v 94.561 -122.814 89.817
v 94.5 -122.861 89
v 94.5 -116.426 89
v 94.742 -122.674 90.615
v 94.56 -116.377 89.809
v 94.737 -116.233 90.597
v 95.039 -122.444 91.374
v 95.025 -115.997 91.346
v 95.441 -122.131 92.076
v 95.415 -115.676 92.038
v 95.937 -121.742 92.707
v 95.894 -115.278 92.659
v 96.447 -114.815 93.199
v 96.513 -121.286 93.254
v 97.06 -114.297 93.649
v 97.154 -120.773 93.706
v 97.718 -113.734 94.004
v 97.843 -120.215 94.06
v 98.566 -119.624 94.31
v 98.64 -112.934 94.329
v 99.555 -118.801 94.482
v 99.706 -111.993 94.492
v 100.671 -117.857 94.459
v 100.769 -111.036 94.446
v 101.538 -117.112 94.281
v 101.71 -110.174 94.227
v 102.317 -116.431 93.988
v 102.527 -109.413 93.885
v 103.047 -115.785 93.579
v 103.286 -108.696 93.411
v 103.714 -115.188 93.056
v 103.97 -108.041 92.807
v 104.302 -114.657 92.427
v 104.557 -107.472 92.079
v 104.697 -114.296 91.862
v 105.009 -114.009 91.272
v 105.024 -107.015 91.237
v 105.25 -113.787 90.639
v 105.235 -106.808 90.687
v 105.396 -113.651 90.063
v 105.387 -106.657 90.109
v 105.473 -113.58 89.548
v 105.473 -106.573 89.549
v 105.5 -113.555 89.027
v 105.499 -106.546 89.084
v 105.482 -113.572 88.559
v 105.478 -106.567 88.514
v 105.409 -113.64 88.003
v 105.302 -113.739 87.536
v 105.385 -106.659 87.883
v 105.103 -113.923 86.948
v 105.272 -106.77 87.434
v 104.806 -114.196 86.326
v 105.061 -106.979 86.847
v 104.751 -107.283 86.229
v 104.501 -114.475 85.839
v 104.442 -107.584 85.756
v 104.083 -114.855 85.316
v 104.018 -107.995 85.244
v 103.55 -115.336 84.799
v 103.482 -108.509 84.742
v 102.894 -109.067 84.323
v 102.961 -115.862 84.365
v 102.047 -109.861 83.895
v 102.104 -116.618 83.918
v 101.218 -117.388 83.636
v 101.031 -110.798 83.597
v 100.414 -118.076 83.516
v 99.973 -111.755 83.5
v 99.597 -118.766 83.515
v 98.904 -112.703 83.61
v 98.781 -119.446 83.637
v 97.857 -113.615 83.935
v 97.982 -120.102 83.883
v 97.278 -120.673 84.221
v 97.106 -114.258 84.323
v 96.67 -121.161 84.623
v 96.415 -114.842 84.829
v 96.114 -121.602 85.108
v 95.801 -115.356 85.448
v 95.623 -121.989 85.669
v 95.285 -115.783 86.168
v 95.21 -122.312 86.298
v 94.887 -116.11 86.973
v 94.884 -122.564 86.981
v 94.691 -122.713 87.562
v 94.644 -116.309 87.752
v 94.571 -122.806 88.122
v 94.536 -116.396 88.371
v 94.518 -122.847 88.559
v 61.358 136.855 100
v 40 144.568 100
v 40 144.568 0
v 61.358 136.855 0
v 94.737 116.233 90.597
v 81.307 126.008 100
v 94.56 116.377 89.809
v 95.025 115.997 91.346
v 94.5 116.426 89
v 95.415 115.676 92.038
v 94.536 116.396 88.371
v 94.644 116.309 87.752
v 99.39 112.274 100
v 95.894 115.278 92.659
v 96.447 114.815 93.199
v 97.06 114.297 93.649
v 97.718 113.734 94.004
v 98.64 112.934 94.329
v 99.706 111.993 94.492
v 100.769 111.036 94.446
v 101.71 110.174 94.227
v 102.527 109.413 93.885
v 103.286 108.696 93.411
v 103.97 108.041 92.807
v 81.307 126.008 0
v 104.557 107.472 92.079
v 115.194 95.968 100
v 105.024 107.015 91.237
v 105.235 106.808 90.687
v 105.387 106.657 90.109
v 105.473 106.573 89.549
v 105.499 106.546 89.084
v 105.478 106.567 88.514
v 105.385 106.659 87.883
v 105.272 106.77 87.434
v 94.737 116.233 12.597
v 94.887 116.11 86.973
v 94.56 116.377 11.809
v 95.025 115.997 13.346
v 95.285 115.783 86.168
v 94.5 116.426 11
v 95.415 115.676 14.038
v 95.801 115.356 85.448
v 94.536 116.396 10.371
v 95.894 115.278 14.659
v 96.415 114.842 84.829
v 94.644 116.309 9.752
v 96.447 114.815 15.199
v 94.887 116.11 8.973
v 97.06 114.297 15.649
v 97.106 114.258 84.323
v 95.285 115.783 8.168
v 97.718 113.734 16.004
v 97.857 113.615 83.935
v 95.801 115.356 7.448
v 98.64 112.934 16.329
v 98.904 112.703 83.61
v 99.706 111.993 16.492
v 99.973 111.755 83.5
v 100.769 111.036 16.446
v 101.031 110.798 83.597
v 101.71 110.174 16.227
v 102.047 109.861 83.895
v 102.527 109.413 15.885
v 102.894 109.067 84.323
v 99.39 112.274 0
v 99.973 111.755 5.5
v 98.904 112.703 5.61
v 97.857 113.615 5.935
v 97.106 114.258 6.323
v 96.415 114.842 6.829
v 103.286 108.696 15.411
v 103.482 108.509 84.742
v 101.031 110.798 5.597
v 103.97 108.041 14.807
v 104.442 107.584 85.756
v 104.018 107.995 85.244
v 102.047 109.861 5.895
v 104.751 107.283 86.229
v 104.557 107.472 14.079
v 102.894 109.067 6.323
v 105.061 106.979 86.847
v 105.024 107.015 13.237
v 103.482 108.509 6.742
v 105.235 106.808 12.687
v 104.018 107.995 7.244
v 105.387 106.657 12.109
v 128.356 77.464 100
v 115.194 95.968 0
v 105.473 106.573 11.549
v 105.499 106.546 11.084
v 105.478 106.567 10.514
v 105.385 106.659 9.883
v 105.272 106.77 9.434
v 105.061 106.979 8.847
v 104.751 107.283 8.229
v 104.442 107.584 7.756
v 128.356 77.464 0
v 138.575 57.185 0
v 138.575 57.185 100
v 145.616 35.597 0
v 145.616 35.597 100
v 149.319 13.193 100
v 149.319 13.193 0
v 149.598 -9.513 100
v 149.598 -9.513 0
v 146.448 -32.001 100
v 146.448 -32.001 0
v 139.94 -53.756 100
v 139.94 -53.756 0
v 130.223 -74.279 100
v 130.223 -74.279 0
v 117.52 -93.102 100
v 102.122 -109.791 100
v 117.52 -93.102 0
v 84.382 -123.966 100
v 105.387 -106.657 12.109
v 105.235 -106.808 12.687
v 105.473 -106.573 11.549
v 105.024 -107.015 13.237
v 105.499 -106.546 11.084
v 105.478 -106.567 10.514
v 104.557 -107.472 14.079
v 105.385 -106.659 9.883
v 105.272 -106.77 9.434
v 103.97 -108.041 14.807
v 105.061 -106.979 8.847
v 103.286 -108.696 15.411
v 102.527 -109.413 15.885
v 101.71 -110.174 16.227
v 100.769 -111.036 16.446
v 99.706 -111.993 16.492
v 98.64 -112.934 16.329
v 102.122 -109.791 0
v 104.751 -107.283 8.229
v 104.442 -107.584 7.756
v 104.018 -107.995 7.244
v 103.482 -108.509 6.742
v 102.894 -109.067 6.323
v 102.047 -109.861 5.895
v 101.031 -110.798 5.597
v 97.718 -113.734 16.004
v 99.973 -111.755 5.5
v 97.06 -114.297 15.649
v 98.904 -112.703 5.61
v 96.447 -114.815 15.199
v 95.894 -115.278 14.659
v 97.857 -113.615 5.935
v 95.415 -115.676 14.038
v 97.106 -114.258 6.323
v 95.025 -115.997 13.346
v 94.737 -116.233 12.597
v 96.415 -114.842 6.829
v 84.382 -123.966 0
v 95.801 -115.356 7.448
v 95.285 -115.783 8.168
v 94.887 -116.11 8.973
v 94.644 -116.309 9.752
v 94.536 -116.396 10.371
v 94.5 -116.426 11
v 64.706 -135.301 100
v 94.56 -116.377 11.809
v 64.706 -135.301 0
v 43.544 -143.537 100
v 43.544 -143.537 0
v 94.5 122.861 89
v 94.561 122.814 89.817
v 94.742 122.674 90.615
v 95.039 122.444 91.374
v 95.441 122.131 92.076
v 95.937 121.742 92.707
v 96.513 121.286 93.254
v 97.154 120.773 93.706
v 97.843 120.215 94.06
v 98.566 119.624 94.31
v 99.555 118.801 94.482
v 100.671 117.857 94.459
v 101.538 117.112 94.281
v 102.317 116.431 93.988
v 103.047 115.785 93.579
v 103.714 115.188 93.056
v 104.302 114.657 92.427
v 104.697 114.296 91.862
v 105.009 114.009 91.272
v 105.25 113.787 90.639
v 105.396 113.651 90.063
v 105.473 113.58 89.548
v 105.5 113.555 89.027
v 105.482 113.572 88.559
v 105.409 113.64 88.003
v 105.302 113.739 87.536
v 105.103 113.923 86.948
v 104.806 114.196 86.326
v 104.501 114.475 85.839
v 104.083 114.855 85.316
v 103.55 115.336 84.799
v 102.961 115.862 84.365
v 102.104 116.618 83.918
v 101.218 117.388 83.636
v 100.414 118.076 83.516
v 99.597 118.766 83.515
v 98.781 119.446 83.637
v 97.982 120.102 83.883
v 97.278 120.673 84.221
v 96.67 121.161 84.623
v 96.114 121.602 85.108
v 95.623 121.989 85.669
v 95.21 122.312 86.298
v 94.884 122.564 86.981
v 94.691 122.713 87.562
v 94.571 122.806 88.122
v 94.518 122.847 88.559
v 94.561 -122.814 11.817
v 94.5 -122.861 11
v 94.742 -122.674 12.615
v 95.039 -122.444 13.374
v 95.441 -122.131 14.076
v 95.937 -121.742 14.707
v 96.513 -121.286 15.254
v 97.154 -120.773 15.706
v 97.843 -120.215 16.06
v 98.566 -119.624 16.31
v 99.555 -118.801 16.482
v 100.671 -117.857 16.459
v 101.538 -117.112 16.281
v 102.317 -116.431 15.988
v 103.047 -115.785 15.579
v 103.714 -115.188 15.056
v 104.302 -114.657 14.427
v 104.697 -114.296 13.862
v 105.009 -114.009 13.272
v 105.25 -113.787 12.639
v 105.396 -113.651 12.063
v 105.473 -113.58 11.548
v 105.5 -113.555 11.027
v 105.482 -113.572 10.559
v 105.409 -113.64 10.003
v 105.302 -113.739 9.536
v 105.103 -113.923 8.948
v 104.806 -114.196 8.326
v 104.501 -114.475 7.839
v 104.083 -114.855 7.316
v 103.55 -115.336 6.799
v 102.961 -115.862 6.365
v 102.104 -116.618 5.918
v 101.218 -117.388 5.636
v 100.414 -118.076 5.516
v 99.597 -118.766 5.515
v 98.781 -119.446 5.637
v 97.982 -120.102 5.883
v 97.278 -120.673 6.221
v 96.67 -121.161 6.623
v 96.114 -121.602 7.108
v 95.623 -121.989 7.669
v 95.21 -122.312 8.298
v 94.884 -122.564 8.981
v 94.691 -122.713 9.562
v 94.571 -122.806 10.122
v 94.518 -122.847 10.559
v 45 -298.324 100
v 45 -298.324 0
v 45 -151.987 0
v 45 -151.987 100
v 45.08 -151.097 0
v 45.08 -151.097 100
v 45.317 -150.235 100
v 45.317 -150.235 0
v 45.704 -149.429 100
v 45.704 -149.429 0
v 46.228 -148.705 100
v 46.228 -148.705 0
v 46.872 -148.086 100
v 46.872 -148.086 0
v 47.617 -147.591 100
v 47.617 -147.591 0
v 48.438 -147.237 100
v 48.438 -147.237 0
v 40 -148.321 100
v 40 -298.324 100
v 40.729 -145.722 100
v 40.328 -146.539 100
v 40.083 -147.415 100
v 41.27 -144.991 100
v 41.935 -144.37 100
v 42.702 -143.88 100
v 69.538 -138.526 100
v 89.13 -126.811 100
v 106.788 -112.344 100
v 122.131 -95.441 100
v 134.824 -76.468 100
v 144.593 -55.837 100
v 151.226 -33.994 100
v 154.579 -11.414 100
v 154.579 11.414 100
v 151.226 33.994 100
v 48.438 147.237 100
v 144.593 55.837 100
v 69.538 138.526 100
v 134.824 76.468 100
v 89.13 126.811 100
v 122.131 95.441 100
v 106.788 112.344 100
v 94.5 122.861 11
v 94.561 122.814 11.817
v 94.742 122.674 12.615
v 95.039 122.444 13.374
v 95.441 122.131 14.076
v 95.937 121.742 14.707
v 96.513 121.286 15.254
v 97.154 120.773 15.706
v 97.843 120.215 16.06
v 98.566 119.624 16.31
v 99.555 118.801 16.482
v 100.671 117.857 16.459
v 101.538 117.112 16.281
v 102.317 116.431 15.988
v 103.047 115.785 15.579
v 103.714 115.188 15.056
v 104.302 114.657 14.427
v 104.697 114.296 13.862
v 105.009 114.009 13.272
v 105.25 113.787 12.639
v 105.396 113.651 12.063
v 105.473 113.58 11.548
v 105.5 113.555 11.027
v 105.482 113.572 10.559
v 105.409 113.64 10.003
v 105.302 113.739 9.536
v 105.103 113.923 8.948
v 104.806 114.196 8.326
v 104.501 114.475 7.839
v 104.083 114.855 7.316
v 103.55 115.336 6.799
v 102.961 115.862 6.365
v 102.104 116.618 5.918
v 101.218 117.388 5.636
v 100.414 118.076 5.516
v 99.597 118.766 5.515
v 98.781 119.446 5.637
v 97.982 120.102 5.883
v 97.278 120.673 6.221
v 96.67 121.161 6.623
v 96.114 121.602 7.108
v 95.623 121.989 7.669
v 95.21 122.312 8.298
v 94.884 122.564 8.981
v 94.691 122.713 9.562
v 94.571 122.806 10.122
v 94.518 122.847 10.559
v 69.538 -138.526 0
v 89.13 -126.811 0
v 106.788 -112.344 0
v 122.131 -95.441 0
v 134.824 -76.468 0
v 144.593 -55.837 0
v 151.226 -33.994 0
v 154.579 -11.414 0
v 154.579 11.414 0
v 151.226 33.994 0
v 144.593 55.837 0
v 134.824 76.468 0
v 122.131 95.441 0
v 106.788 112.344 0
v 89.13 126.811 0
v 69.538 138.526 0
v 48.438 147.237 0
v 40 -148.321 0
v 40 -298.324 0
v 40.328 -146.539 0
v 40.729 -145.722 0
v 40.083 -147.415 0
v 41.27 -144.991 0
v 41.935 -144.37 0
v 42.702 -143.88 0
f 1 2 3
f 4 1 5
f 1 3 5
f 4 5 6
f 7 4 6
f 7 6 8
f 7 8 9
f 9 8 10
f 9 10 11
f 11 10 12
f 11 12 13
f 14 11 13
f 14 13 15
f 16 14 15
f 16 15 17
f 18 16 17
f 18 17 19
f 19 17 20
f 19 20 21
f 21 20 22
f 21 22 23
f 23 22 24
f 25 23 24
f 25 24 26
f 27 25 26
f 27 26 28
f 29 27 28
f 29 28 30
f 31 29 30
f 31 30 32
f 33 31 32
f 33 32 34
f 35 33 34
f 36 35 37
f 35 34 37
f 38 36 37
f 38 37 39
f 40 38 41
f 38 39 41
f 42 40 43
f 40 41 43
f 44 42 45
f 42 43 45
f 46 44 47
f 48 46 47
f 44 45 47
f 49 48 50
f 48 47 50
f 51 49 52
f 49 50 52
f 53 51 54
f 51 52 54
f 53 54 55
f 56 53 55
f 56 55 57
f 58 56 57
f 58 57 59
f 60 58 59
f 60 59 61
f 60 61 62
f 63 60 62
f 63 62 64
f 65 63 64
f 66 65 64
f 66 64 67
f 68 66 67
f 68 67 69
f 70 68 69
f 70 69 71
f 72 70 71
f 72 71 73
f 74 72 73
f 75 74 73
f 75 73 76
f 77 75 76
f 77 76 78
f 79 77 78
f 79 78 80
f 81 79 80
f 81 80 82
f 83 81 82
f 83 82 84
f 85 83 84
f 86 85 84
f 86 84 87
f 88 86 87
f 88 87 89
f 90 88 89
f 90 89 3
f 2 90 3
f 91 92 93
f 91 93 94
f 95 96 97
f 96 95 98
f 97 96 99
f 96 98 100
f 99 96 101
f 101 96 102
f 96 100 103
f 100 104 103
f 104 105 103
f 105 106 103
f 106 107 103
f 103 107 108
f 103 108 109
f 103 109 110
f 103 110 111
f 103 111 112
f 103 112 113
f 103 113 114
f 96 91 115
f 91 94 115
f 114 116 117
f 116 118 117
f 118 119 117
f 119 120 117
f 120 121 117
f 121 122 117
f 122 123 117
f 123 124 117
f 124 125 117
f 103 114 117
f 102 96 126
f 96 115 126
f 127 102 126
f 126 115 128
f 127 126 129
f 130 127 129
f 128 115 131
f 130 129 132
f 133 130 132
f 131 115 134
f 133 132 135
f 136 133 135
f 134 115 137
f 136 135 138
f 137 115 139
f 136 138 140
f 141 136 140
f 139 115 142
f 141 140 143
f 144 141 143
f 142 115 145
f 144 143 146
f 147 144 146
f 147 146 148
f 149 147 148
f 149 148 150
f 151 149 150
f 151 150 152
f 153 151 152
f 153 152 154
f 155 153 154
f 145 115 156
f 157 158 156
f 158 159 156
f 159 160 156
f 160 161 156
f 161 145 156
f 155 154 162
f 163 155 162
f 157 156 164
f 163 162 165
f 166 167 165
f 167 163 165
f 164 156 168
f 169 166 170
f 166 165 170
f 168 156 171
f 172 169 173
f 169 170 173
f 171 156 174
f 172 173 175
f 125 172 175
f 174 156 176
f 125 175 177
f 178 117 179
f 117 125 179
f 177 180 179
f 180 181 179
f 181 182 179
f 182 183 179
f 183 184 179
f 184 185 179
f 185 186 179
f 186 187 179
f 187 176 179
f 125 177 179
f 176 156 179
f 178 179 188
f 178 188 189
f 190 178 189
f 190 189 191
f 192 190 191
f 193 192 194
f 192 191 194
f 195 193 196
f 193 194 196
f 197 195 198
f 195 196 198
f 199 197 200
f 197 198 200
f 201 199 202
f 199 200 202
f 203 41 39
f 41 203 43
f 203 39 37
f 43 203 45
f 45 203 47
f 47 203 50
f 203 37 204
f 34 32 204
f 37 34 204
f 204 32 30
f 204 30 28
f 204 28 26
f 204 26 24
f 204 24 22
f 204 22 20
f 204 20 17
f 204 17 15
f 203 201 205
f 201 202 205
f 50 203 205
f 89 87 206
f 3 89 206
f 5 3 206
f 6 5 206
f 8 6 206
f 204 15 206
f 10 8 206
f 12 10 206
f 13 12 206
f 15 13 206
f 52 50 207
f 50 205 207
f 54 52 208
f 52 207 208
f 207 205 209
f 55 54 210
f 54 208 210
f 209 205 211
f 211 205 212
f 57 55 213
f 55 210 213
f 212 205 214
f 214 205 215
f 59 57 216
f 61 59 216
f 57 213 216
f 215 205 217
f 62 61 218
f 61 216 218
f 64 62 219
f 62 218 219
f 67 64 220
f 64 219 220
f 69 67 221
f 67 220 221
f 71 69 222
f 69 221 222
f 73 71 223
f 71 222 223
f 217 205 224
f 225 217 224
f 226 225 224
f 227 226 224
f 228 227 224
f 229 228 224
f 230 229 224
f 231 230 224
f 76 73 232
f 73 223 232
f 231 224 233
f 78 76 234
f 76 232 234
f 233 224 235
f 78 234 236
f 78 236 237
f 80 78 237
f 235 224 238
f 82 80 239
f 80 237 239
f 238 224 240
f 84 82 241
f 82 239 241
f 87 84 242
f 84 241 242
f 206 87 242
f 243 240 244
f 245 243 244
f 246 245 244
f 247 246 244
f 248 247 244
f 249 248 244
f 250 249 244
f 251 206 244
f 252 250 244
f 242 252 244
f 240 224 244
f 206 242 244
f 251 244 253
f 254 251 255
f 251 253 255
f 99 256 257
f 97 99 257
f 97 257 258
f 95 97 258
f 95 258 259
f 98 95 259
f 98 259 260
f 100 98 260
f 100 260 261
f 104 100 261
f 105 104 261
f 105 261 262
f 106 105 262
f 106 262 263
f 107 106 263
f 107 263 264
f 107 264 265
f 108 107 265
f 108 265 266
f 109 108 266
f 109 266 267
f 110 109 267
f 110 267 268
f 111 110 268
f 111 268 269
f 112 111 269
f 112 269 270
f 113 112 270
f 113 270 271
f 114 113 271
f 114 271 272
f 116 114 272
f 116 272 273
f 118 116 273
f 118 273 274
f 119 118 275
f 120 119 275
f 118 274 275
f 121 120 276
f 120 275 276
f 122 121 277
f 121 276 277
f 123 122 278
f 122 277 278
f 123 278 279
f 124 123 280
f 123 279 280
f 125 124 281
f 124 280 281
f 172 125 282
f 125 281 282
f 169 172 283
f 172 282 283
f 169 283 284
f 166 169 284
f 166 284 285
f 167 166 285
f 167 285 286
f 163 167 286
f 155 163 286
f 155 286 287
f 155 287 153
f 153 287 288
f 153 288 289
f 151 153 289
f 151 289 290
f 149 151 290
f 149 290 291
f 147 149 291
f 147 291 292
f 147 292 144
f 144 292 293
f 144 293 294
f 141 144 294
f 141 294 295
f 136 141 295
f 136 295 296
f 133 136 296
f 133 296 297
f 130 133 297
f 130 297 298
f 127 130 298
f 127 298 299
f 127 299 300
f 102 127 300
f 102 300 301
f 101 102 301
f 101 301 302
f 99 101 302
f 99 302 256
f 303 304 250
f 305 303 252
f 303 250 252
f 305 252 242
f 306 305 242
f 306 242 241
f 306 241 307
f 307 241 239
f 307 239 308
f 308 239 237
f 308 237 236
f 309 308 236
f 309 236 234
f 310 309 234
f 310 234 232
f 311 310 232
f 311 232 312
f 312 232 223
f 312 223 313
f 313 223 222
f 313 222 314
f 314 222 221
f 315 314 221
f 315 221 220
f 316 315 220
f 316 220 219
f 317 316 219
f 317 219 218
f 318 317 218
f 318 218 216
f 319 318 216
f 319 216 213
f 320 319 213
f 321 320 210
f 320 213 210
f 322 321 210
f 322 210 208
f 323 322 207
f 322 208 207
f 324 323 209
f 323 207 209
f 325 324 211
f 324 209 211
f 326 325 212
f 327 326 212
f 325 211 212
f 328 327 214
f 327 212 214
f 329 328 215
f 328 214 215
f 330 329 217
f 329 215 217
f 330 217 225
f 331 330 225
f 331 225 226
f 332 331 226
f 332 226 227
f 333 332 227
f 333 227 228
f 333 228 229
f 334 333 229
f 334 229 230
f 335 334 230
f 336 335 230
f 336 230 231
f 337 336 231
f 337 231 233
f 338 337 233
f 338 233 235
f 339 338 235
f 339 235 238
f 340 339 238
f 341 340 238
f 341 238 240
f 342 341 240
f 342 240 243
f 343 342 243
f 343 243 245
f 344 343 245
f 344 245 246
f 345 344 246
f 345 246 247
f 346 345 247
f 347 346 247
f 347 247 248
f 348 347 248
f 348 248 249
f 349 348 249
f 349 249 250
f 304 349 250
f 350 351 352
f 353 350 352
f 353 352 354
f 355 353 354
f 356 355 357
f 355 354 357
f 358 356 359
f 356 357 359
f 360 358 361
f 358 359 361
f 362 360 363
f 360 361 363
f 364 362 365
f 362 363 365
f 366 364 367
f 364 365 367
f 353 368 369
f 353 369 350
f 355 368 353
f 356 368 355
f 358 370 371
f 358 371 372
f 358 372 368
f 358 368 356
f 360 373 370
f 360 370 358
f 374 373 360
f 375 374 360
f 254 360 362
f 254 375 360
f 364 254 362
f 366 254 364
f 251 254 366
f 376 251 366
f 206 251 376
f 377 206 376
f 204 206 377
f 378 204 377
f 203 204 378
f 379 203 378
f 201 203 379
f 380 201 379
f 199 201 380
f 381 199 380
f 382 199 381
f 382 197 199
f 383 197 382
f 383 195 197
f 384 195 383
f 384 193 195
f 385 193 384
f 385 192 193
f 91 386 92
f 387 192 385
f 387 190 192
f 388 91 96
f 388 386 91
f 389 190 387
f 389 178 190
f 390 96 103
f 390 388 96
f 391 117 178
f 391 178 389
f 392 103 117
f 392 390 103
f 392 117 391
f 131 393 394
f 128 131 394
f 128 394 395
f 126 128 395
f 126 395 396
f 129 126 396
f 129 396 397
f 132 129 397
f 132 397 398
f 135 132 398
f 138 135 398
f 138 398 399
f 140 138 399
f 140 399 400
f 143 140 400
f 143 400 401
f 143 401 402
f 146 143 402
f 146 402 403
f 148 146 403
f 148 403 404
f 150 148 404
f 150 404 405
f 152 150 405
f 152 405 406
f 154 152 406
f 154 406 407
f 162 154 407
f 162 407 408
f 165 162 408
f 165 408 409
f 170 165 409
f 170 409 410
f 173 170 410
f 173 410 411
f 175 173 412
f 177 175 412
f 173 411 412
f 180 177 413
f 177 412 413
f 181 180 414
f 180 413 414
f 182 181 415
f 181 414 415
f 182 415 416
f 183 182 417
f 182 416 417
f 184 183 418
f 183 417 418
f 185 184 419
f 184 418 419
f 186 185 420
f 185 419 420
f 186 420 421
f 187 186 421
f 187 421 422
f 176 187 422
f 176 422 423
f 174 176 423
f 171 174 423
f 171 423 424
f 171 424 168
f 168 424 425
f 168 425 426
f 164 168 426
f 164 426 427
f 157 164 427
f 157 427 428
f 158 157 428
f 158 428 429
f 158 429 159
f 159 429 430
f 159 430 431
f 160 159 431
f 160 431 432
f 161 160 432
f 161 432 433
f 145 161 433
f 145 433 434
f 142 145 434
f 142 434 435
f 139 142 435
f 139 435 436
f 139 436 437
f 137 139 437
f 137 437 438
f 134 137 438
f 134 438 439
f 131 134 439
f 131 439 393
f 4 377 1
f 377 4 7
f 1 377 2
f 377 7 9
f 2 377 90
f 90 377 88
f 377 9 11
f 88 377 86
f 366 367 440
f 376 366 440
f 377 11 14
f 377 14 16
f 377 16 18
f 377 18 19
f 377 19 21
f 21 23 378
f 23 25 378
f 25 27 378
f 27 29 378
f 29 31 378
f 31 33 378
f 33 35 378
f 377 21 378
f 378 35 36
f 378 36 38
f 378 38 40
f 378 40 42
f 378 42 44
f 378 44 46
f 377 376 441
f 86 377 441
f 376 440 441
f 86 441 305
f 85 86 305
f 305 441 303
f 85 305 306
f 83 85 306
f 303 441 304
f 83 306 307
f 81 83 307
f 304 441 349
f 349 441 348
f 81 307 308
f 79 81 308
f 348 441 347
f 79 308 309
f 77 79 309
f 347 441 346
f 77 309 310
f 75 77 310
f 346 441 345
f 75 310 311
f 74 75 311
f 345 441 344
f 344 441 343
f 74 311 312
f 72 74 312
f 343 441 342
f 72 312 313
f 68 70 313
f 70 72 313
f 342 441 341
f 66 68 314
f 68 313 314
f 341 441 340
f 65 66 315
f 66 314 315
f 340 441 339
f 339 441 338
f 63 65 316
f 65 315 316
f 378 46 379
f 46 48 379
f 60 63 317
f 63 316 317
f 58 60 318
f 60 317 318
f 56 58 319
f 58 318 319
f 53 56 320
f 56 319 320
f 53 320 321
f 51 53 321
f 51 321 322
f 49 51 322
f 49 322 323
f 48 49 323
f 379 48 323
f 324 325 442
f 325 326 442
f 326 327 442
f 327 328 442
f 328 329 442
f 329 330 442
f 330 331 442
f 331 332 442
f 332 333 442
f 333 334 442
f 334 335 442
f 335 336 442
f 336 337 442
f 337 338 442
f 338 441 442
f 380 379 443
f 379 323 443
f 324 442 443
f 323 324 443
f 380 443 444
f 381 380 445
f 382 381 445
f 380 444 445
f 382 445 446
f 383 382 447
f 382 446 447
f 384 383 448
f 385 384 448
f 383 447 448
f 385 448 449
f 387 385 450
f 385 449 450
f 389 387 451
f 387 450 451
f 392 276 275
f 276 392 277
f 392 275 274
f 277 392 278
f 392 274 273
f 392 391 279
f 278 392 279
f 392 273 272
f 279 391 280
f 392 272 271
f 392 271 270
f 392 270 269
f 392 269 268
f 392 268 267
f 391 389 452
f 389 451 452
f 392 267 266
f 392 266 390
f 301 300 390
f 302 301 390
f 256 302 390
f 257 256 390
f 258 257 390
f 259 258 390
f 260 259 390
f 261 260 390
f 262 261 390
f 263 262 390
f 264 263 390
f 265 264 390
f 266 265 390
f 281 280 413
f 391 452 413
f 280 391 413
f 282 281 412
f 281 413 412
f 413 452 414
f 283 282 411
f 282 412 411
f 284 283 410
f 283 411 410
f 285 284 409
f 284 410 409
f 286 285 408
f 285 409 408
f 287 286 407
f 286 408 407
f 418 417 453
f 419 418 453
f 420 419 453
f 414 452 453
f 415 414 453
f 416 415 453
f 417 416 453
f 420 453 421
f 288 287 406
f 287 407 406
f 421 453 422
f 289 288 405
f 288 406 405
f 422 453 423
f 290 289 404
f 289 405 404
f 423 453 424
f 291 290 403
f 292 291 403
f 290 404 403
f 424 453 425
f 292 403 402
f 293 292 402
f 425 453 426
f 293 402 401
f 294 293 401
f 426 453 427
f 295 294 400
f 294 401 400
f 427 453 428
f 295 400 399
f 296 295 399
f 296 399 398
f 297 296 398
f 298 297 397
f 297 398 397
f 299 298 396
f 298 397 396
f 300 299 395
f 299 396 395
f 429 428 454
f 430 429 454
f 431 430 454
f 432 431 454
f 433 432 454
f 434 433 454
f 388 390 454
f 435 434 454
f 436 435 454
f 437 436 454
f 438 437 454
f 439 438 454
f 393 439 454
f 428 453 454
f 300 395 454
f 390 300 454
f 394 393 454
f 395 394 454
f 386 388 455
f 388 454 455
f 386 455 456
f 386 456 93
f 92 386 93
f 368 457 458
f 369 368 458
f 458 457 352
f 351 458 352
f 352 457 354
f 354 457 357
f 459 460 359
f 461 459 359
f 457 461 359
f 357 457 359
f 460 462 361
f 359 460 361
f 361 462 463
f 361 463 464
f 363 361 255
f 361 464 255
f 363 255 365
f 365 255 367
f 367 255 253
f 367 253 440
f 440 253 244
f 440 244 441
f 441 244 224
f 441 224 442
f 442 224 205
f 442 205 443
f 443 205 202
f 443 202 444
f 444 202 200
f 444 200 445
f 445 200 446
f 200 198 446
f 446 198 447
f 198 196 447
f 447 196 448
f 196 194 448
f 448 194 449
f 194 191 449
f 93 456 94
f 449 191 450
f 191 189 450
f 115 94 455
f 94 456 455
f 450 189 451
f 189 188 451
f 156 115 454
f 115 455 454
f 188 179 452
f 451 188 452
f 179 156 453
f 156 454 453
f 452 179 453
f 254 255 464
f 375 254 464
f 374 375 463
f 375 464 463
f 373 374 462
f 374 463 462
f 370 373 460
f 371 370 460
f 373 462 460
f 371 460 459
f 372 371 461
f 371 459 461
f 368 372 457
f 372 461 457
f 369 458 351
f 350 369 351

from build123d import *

# Parameters (mm, degrees)
F1_DEPTH = 100
F3_D     = 11


with BuildPart() as f1:
    # F0 (on Top) → F1 (new body)
    with BuildSketch(Plane.XY):
        with BuildLine():
            Line((45, -298.3239697419), (45, -151.9868415357))
            ThreePointArc((45, -151.9868415357), (45.9495370635, -149.0553316858), (48.4375, -147.2372527377))
            ThreePointArc((48.4375, -147.2372527377), (155, 0), (48.4375, 147.2372527377))
            Line((48.4375, 147.2372527377), (40, 144.568322948))
            ThreePointArc((40, 144.568322948), (149.8888164954, 1.8456395549), (43.5443348323, -143.5371914998))
            ThreePointArc((43.5443348323, -143.5371914998), (40.9826422963, -145.343888573), (40, -148.3206043943))
            Line((40, -148.3206043943), (40, -298.3239697419))
            Line((40, -298.3239697419), (45, -298.3239697419))
        make_face()
    extrude(amount=F1_DEPTH)

    # F3 (through all)
    with Locations(Plane.XZ.offset(298.3239697419)):
        with Locations((100, 89), (100, 11)):
            Hole(F3_D / 2)


solid = f1.part
